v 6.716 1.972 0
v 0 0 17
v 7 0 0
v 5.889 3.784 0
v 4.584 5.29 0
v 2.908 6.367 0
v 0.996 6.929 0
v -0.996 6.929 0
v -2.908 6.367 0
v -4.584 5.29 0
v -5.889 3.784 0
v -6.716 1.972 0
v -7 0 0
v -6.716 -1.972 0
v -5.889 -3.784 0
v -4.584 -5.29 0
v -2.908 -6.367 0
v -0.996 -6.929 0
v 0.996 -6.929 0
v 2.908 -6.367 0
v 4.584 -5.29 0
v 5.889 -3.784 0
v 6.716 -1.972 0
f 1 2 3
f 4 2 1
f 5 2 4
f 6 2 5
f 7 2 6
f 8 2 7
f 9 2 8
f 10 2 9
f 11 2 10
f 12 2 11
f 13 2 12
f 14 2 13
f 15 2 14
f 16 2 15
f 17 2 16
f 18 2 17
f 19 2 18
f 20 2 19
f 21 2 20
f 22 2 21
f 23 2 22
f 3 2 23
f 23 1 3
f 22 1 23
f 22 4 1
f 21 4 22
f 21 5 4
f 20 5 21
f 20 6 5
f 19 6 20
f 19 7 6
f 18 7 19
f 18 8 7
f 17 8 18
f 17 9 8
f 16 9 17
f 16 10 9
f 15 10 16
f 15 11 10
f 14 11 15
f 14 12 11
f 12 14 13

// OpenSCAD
// Generated by SolidPython 1.0.1 on 2020-07-29 00:46:43


cylinder(h = 17, r1 = 7, r2 = 0);
/***********************************************
*********      SolidPython code:      **********
************************************************
 
# import packages: SolidPython
from solid import *
from solid.utils import *
from itertools import chain, combinations, permutations


class Resize:

    def __init__(self, scad_file):
        self.scad_file = scad_file
        #self.scad_file = import_scad(scad_file)
        # cone/cylinder param:
        self.r1 = 0
        self.r2 = 0
        self.h = 0
        # rectangular prism param:
        self.w = 0
        self.l = 0
        # ellipse param:
        self.r = 0

    # import OpenScad code (file name corresponds to shape)


    # classify shape + parameters
    def assign(self, param1, param2, param3):
        if self.scad_file == 'cone.scad':
            self.r1 = param1
            self.r2 = param2
            self.h = param3
        elif self.scad_file == 'cylinder.scad':
            self.r1 = param1
            self.r2 = param2
            self.h = param3
        elif self.scad_file == 'rectangularPrism.scad':
            self.h = param1
            self.l = param2
            self.w = param3
        else:
            self.r = param1
            self.h = param2

    # resize parameters
    def iterate(self):
        x = range(3, 20, 2)
        i = 1
        if self.scad_file == 'cone.scad':
            tempList = list(permutations(x, 2))
            for temp in tempList:
                param1 = temp[0]
                param2 = temp[1]
                filepath = 'produced_scad_files/' + 'cone' + str(param1) + '_' + str(param2) + '_' + '.scad'
                scad_render_to_file(cylinder(h=param1, r1=param2, r2=0), filepath)

        elif self.scad_file == 'cylinder.scad':
            tempList = list(permutations(x, 3))
            for temp in tempList:
                param1 = temp[0]
                param2 = temp[1]
                filepath = 'produced_scad_files/' + 'cylinder' + str(param1) + '_' + str(param2) + '_' + '.scad'
                scad_render_to_file(cylinder(h=param1, r1=param2, r2=param2), filepath)

        elif self.scad_file == 'rectangularPrism.scad':
            tempList = list(permutations(x, 3))
            for temp in tempList:
                param1 = temp[0]
                param2 = temp[1]
                param3 = temp[2]
                filepath = 'produced_scad_files/' + 'rectangularPrism' + str(param1) + '_' + str(param2) + '_' + str(
                    param3) + '.scad'
                scad_render_to_file(cube(size=(param1, param2, param3)), filepath)

        elif self.scad_file == 'ellipse.scad':
            tempList = list(permutations(x, 4))
            for temp in tempList:
                param1 = temp[0]
                param2 = temp[1]
                param3 = temp[2]
                param4 = temp[3]
                filepath = 'produced_scad_files/' + 'ellipse' + str(param1) + '_' + str(param2) + '_' + str(param3) + '_' + str(param4) + '.scad'
                scad_render_to_file(scale([param1, param2, param3])(sphere(r=param4)), filepath)

    def render_to_scadfile(self):
        scad_render_to_file(scad, 'example.scad') 
 
************************************************/
